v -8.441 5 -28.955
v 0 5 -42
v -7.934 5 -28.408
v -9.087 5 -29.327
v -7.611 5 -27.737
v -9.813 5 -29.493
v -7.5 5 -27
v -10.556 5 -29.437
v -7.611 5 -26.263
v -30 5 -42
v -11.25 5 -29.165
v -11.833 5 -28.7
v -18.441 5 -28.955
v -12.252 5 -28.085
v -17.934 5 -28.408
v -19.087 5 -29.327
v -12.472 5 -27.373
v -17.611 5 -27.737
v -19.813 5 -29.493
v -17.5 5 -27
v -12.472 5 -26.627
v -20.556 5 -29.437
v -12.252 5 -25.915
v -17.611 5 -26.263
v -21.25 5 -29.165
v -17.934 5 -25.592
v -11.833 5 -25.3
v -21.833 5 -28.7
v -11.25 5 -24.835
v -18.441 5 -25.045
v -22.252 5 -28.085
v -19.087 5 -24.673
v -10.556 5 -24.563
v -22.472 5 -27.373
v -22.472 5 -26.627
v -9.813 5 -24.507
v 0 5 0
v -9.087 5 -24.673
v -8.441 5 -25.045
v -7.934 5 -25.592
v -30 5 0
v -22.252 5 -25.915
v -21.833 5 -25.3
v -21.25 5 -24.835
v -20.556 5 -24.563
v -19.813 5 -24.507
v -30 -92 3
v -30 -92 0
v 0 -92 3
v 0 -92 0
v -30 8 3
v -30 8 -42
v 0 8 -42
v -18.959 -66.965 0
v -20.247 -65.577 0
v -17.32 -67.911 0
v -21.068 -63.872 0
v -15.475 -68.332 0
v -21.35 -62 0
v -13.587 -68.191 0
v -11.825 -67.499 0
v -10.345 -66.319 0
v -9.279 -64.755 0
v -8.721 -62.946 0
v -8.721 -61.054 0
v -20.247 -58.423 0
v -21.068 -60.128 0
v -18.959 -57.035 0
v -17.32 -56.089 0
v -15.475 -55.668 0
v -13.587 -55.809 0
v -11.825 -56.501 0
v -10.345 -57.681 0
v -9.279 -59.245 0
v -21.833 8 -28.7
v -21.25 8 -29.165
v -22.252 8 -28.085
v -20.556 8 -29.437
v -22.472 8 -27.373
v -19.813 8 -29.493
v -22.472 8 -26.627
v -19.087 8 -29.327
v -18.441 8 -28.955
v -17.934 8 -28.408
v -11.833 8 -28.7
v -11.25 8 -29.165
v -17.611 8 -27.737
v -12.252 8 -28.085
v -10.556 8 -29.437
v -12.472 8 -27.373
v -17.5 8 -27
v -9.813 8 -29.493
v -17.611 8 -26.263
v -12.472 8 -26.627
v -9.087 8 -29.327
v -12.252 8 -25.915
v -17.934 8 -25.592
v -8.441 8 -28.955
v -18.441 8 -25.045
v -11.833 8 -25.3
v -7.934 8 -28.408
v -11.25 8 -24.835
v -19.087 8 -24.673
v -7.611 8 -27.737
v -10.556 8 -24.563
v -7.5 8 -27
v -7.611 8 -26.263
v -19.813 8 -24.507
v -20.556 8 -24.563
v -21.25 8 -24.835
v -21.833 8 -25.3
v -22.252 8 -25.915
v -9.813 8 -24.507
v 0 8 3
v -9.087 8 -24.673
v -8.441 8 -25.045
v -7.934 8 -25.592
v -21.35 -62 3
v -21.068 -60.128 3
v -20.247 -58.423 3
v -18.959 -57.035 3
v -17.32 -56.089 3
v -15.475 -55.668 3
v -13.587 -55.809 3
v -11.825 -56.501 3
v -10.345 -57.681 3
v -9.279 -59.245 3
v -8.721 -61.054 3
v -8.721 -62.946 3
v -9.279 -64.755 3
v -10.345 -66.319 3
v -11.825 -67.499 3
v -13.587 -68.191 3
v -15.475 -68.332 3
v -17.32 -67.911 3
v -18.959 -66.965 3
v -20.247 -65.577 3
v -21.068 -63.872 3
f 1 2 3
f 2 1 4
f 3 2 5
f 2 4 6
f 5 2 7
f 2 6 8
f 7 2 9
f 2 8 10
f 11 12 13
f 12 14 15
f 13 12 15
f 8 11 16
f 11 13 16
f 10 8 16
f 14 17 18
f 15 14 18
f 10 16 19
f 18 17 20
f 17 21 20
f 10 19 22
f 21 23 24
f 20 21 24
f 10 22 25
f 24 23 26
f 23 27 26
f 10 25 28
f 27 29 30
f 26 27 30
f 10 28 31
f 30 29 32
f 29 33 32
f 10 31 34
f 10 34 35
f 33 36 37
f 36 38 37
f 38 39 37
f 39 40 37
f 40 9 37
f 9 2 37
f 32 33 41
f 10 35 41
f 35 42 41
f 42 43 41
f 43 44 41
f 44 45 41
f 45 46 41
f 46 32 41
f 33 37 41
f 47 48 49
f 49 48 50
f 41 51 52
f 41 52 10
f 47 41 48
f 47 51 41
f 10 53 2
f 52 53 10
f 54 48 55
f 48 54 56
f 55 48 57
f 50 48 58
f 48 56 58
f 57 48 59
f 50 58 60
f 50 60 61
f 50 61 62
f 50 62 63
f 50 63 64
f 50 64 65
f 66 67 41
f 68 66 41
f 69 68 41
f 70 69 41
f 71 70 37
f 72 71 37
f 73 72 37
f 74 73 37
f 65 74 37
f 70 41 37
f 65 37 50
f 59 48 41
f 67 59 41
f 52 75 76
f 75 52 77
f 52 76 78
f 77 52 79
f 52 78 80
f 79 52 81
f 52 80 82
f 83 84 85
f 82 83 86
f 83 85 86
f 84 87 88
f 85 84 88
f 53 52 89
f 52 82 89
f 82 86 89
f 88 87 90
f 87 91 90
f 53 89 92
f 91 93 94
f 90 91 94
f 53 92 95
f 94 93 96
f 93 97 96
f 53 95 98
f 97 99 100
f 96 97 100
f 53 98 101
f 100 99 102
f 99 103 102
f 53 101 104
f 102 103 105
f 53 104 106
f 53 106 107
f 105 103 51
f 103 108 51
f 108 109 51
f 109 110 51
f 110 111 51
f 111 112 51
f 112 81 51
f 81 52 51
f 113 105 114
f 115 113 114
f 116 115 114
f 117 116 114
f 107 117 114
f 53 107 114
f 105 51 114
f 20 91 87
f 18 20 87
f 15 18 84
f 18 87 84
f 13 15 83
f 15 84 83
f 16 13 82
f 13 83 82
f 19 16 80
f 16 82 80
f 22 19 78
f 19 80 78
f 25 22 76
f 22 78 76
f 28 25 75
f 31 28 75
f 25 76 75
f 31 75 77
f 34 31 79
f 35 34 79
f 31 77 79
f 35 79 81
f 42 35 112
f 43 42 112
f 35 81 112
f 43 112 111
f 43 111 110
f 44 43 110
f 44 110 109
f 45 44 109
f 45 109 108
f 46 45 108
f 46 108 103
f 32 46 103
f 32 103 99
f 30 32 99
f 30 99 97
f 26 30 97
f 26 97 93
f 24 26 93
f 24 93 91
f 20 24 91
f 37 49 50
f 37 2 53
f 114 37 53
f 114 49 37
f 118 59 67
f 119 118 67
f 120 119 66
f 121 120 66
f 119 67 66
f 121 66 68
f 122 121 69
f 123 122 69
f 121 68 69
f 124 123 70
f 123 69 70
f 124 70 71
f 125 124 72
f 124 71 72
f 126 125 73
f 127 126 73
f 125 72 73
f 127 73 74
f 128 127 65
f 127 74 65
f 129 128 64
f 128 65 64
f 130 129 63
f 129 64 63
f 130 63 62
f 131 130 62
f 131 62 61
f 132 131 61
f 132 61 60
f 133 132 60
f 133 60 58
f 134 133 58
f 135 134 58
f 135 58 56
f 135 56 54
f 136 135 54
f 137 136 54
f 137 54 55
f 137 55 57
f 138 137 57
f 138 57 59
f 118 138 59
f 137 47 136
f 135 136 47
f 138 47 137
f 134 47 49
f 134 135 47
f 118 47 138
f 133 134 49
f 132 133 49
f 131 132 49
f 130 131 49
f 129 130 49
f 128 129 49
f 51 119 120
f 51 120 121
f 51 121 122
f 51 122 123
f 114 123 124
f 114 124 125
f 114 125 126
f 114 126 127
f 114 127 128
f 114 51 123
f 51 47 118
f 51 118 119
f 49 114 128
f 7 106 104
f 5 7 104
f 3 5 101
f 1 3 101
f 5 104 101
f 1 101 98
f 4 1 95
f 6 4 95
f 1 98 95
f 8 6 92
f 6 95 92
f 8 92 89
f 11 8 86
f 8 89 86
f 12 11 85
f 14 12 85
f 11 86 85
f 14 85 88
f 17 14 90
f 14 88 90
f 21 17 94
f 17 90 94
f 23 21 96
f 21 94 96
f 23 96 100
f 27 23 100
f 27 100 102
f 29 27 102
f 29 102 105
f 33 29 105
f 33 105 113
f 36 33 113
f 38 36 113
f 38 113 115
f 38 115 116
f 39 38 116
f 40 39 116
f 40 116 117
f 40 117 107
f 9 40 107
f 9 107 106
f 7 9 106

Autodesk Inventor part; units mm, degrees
ref_plane "YZ Plane" through (0, 0, 0) normal (1, 0, 0) x (0, 1, 0)
ref_plane "XZ Plane" through (0, 0, 0) normal (0, 1, 0) x (-1, 0, 0)
ref_plane "XY Plane" through (0, 0, 0) normal (0, 0, 1) x (1, 0, 0)
sketch "Sketch1" plane through (0, 0, 0) normal (0, 0, 1) x (1, 0, 0)
  line L0 (0, 0) -> (-30, 0)
  line L1 (-30, 0) -> (-30, 8)
  line L2 (-30, 8) -> (0, 8)
  line L3 (0, 8) -> (0, 0)
  line L4 (0, 8) -> (-30, 8)
  line L5 (-30, 8) -> (-30, -92)
  line L6 (-30, -92) -> (0, -92)
  line L7 (0, -92) -> (0, 8)
  dimension "d0" = 30
  dimension "d1" = 8
  dimension "d2" = 100
extrude "Extrusion1" add sketch "Sketch1" along normal blind 3
sketch "Sketch2" plane through (0, 0, 0) normal (0, 0, -1) x (-1, 0, 0)
  line L0 (30, 8) -> (30, -92) projected
  line L1 (0, -92) -> (0, 8) projected
  line L2 (30, 8) -> (0, 8)
  line L3 (0, 8) -> (0, 5)
  line L4 (0, 5) -> (30, 5)
  line L5 (30, 5) -> (30, 8)
  point P0 (0, 0)
  point P1 (0, 8)
  dimension "d5" = 3
extrude "Extrusion2" add sketch "Sketch2" along normal blind 42
sketch "Sketch3" plane through (-30, 8, 3) normal (0, 1, 0) x (1, 0, 0)
  line L0 (0, 45) -> (0, 0) projected
  line L1 (0, 45) -> (0, 30)
  line L2 (0, 30) -> (10, 30)
  circle A0 centre (10, 30) radius 2.5
  line L3 (30, 0) -> (30, 45) projected
  line L4 (30, 45) -> (30, 30)
  circle A1 centre (20, 30) radius 2.5
  point P0 (30, 3)
  dimension "d8" = 15
  dimension "d9" = 10
  dimension "d10" = 5
  dimension "d11" = 15
  dimension "d12" = 5
  dimension "d13" = 10
extrude "Extrusion3" cut sketch "Sketch3" against normal blind 42
sketch "Sketch4" plane through (0, 0, 0) normal (0, 0, -1) x (-1, 0, 0)
  circle A0 centre (15, -62) radius 6.35
  line L0 (30, -92) -> (0, -92) projected
  line L1 (0, -92) -> (0, 5) projected
  point P0 (0, 0)
  dimension "d16" = 12.7
  dimension "d17" = 30
  dimension "d18" = 15
extrude "Extrusion4" cut sketch "Sketch4" against normal blind 42
sketch "Sketch5" plane through (-30, 8, 3) normal (0, 1, 0) x (1, 0, 0)
  point P0 (30, 3)
sketch "Sketch6" plane through (-30, 8, 3) normal (0, 1, 0) x (1, 0, 0)
  point P0 (30, 3)
properties part number "Angle"
